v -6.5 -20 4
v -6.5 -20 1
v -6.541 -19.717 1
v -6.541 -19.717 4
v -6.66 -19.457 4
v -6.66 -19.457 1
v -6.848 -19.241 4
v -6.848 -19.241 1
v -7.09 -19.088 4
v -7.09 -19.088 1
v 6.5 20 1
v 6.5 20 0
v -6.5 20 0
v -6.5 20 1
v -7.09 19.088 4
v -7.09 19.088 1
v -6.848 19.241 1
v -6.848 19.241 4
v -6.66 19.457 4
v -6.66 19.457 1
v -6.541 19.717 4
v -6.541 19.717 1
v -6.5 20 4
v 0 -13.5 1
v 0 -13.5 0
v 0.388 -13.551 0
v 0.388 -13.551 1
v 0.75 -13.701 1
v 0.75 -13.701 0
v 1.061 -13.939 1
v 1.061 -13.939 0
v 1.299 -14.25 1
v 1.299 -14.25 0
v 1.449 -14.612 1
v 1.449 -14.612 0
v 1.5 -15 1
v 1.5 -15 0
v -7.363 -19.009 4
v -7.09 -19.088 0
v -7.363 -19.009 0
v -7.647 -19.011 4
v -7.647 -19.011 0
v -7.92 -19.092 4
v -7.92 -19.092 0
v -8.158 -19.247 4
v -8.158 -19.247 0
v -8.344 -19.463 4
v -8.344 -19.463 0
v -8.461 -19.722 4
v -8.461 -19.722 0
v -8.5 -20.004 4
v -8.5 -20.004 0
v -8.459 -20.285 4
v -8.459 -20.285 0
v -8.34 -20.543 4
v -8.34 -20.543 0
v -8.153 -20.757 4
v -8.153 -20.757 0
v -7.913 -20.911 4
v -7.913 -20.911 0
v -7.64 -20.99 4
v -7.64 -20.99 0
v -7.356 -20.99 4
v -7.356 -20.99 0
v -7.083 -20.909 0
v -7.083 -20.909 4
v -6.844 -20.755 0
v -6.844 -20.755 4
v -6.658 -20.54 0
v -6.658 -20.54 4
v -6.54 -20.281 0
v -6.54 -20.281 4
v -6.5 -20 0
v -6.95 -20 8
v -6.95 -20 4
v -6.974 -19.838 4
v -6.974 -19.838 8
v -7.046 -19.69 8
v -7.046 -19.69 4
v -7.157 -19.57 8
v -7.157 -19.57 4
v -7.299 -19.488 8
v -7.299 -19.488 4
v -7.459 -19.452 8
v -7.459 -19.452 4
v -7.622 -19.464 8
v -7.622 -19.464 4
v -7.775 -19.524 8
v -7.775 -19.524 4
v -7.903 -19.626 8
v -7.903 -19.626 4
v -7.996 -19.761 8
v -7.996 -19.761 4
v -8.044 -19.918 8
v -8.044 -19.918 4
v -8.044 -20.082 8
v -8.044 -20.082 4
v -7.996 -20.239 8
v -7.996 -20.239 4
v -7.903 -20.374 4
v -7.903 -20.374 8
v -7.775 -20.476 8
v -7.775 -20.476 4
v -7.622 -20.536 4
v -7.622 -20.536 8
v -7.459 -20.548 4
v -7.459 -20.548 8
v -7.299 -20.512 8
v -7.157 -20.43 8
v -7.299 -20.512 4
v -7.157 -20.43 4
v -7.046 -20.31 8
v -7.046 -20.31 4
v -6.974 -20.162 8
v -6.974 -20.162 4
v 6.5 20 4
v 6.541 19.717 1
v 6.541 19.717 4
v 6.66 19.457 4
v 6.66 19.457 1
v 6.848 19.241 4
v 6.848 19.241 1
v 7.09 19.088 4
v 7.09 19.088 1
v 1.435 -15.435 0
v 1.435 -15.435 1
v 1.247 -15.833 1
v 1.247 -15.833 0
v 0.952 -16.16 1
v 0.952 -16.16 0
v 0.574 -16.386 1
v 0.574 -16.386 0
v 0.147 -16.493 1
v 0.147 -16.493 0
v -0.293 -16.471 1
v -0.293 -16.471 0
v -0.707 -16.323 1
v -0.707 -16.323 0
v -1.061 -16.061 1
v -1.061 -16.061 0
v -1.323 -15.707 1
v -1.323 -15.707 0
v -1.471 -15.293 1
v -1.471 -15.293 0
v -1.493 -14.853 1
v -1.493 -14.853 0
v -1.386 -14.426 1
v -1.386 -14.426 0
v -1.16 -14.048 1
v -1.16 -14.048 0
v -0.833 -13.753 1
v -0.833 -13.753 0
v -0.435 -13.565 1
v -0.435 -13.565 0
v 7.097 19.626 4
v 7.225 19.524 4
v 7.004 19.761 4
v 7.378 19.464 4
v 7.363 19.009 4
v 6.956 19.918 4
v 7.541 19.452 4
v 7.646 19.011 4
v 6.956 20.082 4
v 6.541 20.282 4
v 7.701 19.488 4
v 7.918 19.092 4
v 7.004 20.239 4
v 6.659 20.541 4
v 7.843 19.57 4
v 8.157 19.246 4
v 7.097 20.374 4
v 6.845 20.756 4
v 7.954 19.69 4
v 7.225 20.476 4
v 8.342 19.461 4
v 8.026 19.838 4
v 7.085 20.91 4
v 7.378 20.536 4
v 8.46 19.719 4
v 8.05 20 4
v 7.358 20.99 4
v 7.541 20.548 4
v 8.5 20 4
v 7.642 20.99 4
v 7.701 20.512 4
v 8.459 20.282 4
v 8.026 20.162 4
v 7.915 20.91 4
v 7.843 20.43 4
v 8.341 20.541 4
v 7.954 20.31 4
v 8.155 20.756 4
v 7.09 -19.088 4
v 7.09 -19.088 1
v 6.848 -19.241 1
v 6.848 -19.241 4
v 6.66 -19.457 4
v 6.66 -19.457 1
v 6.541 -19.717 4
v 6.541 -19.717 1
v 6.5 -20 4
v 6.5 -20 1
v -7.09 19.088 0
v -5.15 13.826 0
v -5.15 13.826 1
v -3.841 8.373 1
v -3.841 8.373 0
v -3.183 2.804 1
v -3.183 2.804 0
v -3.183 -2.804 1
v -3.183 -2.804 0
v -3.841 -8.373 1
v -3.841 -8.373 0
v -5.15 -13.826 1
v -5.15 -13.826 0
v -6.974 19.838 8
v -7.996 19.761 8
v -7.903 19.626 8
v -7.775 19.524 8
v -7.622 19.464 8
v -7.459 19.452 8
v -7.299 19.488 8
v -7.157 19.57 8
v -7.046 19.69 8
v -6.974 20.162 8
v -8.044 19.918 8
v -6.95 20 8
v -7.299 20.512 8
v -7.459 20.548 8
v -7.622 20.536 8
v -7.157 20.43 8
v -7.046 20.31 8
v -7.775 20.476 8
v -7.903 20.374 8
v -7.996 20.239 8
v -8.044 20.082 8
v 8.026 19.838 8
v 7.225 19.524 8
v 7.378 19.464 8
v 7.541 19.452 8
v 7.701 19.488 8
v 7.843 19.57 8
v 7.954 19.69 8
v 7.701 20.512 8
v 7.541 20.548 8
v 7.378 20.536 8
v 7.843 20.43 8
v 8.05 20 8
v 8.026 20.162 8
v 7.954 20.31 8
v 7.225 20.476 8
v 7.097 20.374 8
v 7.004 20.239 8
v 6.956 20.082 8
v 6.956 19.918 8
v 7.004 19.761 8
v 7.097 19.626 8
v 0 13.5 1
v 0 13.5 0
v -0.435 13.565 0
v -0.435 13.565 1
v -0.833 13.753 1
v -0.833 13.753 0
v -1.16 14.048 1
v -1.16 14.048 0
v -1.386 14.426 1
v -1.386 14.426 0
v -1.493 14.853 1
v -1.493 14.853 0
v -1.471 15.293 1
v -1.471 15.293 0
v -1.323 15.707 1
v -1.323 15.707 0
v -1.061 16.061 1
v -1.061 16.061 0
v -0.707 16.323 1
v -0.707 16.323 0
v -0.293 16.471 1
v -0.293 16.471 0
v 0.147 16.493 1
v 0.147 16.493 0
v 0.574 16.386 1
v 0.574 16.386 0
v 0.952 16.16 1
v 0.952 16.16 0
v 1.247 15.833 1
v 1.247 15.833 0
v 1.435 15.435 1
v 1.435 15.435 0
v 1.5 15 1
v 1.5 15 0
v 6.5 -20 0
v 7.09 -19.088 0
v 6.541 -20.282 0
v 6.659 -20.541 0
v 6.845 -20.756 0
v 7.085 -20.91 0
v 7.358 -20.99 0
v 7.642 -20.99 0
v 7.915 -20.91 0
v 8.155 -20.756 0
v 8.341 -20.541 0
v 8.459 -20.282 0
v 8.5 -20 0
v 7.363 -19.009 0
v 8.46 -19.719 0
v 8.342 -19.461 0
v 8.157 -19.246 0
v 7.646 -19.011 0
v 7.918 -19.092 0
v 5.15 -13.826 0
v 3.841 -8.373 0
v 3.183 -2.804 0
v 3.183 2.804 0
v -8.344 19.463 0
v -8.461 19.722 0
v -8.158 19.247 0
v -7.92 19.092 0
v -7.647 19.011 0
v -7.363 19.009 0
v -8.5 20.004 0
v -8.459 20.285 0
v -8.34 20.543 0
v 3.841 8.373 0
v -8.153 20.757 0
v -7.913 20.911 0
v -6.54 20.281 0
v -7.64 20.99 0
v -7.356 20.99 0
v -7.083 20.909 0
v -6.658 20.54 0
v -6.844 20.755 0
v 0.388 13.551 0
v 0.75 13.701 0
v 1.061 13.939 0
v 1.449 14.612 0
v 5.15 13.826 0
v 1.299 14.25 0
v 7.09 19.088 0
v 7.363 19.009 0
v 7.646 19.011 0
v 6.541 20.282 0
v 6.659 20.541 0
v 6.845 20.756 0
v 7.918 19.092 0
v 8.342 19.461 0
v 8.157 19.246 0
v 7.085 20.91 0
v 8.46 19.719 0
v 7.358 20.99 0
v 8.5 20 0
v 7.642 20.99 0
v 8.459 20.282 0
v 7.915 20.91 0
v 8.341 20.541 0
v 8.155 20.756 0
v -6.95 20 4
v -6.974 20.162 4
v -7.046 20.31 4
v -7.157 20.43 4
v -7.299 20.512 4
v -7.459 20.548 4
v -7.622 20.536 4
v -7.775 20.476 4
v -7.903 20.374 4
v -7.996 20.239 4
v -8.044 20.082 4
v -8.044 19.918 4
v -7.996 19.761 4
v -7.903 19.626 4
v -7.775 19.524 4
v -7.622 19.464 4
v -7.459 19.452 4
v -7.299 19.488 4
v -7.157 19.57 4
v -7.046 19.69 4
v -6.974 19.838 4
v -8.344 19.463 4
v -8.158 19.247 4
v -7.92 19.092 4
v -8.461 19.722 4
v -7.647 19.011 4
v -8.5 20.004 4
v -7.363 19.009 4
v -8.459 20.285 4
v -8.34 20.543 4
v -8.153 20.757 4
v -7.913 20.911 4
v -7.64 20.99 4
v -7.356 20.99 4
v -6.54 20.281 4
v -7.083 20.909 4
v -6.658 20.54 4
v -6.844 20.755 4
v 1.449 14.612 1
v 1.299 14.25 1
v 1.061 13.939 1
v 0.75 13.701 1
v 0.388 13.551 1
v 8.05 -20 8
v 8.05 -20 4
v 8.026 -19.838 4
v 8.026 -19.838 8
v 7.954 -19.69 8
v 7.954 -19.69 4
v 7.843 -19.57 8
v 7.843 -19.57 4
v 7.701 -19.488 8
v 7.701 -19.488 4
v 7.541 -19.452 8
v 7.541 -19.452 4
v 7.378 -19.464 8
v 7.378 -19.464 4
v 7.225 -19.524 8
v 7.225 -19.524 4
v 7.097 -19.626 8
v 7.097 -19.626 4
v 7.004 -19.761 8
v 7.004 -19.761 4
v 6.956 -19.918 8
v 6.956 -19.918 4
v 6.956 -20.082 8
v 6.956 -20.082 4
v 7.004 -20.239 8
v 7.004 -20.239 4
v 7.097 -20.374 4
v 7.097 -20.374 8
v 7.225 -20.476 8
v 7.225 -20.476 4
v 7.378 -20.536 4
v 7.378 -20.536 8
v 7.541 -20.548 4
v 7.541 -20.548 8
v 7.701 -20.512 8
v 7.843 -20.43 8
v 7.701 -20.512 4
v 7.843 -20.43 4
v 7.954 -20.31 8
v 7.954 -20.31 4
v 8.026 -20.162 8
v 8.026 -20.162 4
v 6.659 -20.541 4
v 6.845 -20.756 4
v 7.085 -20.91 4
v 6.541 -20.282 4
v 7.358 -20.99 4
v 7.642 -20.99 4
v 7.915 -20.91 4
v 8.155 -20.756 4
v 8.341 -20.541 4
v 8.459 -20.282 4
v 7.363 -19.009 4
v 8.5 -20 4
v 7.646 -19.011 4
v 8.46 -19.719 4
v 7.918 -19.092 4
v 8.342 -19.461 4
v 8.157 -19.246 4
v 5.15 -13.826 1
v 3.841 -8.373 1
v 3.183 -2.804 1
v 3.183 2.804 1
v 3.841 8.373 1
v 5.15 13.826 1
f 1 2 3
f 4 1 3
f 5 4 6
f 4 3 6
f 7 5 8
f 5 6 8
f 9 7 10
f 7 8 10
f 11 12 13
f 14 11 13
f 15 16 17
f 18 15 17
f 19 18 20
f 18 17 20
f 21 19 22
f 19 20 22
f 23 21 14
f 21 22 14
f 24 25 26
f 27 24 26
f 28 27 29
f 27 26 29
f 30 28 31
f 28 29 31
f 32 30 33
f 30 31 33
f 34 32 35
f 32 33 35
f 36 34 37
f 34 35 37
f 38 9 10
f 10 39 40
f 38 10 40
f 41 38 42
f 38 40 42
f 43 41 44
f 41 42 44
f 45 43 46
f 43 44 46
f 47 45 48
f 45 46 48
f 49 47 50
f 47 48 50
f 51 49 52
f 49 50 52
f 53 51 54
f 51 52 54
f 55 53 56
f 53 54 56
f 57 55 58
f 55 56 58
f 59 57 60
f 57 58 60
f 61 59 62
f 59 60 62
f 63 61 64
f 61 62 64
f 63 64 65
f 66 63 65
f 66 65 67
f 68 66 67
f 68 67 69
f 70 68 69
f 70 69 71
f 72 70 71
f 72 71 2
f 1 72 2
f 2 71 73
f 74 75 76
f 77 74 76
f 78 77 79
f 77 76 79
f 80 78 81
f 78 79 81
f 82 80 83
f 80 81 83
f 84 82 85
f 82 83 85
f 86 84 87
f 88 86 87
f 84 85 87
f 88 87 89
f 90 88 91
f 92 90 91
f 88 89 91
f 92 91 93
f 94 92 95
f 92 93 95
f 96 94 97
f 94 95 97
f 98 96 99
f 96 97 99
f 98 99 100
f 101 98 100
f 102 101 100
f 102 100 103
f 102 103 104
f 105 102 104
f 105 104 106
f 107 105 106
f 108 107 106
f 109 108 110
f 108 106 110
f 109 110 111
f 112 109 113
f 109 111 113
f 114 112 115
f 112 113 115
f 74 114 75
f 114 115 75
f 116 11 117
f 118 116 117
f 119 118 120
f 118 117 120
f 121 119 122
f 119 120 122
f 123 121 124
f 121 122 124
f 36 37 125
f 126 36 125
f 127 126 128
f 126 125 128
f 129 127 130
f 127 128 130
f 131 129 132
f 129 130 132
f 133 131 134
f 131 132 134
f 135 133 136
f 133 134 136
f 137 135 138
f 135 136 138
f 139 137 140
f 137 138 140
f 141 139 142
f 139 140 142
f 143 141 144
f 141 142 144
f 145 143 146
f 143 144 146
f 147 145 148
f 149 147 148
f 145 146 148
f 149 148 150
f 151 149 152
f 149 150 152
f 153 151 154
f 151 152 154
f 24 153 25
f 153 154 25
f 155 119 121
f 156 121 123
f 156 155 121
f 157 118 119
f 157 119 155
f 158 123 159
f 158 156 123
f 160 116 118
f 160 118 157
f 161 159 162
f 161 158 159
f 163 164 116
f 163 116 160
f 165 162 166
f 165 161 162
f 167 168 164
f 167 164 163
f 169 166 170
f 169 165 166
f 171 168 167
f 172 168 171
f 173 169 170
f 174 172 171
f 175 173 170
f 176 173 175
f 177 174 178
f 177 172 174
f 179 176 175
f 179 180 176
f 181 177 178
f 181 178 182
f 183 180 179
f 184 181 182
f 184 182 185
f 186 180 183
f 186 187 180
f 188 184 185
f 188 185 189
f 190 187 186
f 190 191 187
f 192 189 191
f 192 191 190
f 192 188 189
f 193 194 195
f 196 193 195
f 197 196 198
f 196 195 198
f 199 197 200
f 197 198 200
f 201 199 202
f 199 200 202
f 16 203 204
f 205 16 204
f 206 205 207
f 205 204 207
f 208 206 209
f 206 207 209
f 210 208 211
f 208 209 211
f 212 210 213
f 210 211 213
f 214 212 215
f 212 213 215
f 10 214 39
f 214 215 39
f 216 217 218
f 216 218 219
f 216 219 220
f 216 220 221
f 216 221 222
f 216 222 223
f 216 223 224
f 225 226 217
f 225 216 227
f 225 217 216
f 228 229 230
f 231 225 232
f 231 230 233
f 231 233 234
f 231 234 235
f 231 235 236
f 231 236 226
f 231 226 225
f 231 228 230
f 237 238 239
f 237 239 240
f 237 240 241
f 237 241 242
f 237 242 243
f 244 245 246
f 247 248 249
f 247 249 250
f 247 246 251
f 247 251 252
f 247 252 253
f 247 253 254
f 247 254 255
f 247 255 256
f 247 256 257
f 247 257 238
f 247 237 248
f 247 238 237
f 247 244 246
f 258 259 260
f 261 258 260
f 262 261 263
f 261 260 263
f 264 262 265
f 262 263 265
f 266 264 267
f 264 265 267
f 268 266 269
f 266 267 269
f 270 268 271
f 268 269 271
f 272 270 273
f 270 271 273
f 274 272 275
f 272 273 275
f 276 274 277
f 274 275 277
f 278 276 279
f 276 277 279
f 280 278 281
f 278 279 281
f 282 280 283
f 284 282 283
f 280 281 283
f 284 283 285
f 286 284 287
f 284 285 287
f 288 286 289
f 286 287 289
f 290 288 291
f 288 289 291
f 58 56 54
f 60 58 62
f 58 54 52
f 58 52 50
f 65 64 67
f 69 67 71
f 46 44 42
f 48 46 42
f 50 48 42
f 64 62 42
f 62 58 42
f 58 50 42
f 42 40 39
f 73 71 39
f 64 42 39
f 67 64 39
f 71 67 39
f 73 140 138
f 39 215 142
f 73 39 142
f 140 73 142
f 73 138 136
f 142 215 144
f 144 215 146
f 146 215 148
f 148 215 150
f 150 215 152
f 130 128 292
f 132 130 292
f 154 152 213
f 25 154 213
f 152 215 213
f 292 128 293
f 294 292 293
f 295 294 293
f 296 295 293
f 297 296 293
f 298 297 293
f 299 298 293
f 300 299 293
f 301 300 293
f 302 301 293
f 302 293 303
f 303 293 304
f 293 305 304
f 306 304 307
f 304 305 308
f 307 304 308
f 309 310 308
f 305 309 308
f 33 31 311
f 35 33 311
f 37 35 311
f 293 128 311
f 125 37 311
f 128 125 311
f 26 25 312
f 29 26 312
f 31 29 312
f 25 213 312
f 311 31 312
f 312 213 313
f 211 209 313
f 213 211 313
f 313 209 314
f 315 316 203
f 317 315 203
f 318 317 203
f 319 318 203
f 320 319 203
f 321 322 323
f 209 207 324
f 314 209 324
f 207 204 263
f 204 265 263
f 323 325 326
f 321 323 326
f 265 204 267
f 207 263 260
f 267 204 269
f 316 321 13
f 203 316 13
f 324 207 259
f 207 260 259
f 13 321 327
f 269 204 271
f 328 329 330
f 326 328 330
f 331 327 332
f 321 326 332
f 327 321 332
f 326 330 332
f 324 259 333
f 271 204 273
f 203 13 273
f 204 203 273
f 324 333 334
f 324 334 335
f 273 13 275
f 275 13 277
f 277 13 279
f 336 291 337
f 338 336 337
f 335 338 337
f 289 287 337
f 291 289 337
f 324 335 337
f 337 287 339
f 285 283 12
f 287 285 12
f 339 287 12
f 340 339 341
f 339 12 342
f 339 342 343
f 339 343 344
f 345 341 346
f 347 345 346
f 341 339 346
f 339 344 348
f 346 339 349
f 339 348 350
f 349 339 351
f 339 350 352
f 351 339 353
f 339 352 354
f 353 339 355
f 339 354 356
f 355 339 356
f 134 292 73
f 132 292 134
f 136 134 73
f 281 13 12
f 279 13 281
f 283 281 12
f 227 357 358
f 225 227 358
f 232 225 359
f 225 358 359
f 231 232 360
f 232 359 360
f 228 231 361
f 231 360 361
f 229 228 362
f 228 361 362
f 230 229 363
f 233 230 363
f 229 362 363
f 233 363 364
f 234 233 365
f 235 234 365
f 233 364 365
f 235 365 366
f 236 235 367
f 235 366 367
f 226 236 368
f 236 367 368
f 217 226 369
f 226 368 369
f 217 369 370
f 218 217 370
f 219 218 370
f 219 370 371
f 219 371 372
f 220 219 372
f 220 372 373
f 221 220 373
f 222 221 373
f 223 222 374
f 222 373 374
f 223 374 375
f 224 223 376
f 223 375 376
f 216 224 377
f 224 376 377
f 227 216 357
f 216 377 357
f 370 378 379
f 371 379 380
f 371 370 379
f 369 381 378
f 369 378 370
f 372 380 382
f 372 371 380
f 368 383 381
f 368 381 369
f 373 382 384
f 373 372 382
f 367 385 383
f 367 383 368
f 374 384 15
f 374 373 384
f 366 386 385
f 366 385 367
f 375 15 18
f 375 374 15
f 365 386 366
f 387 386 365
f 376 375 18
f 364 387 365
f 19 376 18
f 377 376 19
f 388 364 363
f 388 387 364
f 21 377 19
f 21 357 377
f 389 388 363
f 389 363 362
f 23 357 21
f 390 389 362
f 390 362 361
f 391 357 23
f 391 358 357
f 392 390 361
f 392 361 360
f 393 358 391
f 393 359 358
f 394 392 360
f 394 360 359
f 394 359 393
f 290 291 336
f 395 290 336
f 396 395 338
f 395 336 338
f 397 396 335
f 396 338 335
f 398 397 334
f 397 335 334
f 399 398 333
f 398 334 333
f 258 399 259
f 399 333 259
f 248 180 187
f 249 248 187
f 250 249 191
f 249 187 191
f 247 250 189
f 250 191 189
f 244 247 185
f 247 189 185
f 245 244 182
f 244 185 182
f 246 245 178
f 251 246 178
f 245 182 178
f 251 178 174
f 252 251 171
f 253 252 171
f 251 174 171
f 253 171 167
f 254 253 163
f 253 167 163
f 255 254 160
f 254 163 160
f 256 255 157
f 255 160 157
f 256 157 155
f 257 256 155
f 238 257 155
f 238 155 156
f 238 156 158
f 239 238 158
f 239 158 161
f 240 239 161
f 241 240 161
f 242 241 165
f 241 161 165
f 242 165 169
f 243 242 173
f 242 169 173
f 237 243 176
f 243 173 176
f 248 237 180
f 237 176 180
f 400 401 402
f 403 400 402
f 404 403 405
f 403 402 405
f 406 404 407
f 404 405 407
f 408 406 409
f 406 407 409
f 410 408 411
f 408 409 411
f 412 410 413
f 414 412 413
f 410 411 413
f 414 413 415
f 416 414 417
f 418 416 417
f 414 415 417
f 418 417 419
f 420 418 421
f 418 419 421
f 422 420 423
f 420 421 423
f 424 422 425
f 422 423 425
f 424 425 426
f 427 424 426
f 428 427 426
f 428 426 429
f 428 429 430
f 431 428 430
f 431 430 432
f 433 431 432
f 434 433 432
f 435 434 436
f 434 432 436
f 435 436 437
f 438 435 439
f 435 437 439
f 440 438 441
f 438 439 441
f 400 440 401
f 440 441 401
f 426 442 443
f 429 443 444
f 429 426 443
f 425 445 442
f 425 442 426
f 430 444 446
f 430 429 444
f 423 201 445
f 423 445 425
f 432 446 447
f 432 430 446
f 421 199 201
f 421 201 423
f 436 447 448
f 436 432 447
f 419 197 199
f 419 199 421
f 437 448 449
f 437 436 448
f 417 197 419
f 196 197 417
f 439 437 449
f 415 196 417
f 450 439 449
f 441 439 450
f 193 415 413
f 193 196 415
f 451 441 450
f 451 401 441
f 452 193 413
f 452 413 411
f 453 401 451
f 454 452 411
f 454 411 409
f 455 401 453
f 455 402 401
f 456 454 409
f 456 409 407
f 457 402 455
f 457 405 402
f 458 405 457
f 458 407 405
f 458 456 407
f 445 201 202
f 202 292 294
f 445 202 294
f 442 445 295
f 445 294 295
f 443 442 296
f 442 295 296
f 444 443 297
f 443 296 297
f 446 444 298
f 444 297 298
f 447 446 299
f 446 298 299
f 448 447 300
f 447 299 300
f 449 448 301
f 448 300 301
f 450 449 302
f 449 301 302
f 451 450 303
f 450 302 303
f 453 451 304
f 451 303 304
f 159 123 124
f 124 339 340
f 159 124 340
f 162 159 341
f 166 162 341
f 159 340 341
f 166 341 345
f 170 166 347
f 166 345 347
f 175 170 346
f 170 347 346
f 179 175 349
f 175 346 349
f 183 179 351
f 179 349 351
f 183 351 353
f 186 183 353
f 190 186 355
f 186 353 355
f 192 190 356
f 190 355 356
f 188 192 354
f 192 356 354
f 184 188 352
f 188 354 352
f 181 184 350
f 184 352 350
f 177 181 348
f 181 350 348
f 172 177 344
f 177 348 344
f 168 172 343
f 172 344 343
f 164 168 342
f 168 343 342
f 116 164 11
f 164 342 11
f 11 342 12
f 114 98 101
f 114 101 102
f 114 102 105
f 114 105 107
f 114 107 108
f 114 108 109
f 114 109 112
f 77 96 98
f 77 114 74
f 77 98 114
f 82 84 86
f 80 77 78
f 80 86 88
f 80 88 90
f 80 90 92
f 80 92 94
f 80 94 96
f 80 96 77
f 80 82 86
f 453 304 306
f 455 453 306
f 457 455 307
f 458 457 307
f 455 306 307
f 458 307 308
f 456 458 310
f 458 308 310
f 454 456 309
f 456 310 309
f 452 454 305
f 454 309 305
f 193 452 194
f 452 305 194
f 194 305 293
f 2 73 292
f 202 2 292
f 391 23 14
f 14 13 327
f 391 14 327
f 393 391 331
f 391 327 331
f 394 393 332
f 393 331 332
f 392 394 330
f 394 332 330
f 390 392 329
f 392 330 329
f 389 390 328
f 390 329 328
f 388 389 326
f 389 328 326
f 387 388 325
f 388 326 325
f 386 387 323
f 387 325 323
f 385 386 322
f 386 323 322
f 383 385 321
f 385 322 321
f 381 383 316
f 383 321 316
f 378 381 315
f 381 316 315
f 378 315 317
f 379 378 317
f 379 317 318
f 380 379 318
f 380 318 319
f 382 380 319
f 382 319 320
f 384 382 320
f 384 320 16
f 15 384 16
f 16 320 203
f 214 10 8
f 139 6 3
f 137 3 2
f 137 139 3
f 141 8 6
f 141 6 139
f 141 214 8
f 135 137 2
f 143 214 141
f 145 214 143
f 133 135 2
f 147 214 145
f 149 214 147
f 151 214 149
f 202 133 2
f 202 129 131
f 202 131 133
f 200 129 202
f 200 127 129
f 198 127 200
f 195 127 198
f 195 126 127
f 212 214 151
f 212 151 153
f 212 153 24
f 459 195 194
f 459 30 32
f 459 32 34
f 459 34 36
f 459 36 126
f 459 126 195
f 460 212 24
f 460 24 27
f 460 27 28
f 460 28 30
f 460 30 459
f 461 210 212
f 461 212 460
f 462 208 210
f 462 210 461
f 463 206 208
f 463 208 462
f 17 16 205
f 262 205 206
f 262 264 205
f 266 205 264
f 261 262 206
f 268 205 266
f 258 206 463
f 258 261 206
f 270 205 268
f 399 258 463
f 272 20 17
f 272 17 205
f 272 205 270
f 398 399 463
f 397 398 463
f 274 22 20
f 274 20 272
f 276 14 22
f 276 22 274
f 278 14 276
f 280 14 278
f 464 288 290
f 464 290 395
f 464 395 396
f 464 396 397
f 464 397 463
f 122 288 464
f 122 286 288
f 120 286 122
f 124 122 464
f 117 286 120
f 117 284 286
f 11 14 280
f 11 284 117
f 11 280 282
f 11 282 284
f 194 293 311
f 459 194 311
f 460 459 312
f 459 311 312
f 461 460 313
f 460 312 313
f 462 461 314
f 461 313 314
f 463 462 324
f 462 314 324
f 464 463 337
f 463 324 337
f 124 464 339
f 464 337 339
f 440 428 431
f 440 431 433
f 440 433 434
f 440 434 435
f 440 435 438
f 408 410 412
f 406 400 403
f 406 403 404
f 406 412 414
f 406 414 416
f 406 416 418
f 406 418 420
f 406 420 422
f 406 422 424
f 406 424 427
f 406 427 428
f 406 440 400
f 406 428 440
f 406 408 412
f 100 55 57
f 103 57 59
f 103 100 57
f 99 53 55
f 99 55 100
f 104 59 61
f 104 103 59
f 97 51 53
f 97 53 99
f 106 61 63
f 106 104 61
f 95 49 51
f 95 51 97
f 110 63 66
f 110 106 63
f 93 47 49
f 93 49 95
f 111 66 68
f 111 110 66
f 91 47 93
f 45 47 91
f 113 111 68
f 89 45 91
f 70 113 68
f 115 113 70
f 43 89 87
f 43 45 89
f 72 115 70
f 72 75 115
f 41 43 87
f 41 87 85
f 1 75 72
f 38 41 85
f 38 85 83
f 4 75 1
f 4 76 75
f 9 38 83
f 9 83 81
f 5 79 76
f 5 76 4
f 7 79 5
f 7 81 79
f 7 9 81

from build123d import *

# Parameters (mm, degrees)
F1_DEPTH  = 1
F2_DEPTH  = 4
F3_DEPTH  = 4
F4_R      = 0.55
F5_DEPTH  = 4
F6_R      = 0.55
F7_DEPTH  = 4
F8_R      = 0.55
F9_DEPTH  = 4
F10_R     = 0.55
F11_DEPTH = 4


with BuildPart() as f1:
    # F0 (on Top) → F1 (new body)
    with BuildSketch(Plane.XY):
        with BuildLine():
            Line((-6.5, -20), (6.5, -20))
            ThreePointArc((6.5, -20), (6.660315, -19.456926), (7.089859, -19.087978))
            ThreePointArc((7.089859, -19.087978), (3.1, 0), (7.089859, 19.087978))
            ThreePointArc((7.089859, 19.087978), (6.660315, 19.456926), (6.5, 20))
            Line((6.5, 20), (-6.5, 20))
            ThreePointArc((-6.5, 20), (-6.660315, 19.456926), (-7.089859, 19.087978))
            ThreePointArc((-7.089859, 19.087978), (-3.1, 0), (-7.089859, -19.087978))
            ThreePointArc((-7.089859, -19.087978), (-6.660315, -19.456926), (-6.5, -20))
        make_face()
        with BuildLine():
            ThreePointArc((1.5, -15), (-1.06066, -16.06066), (0, -13.5))
            ThreePointArc((0, -13.5), (1.06066, -13.93934), (1.5, -15))
        make_face(mode=Mode.SUBTRACT)
        with BuildLine():
            ThreePointArc((1.5, 15), (1.06066, 13.93934), (0, 13.5))
            ThreePointArc((0, 13.5), (-1.06066, 16.06066), (1.5, 15))
        make_face(mode=Mode.SUBTRACT)
    extrude(amount=F1_DEPTH)

    # F0 (on Top) → F2 (join)
    with BuildSketch(Plane.XY):
        with BuildLine():
            ThreePointArc((6.5, 20), (6.660315, 19.456926), (7.089859, 19.087978))
            ThreePointArc((7.089859, 19.087978), (8.043074, 19.160315), (8.5, 20))
            ThreePointArc((8.5, 20), (7.5, 21), (6.5, 20))
        make_face()
    extrude(amount=F2_DEPTH)

    # F0 (on Top) → F3 (join)
    with BuildSketch(Plane.XY):
        with BuildLine():
            ThreePointArc((-6.5, 20), (-8.339685, 20.543074), (-7.089859, 19.087978))
            ThreePointArc((-7.089859, 19.087978), (-6.660315, 19.456926), (-6.5, 20))
        make_face()
        with BuildLine():
            ThreePointArc((7.089859, -19.087978), (6.660315, -19.456926), (6.5, -20))
            ThreePointArc((6.5, -20), (7.5, -21), (8.5, -20))
            ThreePointArc((8.5, -20), (8.043074, -19.160315), (7.089859, -19.087978))
        make_face()
        with BuildLine():
            ThreePointArc((-7.089859, -19.087978), (-8.339685, -20.543074), (-6.5, -20))
            ThreePointArc((-6.5, -20), (-6.660315, -19.456926), (-7.089859, -19.087978))
        make_face()
    extrude(amount=F3_DEPTH)

    # F4 (on face) → F5 (join)
    with BuildSketch(Plane.XY.offset(4)):
        with Locations((7.5, 20)):
            Circle(F4_R)
    extrude(amount=F5_DEPTH)

    # F6 (on face) → F7 (join)
    with BuildSketch(Plane.XY.offset(4)):
        with Locations((-7.5, 20)):
            Circle(F6_R)
    extrude(amount=F7_DEPTH)

    # F8 (on face) → F9 (join)
    with BuildSketch(Plane.XY.offset(4)):
        with Locations((7.5, -20)):
            Circle(F8_R)
    extrude(amount=F9_DEPTH)

    # F10 (on face) → F11 (join)
    with BuildSketch(Plane.XY.offset(4)):
        with Locations((-7.5, -20)):
            Circle(F10_R)
    extrude(amount=F11_DEPTH)


solid = f1.part
